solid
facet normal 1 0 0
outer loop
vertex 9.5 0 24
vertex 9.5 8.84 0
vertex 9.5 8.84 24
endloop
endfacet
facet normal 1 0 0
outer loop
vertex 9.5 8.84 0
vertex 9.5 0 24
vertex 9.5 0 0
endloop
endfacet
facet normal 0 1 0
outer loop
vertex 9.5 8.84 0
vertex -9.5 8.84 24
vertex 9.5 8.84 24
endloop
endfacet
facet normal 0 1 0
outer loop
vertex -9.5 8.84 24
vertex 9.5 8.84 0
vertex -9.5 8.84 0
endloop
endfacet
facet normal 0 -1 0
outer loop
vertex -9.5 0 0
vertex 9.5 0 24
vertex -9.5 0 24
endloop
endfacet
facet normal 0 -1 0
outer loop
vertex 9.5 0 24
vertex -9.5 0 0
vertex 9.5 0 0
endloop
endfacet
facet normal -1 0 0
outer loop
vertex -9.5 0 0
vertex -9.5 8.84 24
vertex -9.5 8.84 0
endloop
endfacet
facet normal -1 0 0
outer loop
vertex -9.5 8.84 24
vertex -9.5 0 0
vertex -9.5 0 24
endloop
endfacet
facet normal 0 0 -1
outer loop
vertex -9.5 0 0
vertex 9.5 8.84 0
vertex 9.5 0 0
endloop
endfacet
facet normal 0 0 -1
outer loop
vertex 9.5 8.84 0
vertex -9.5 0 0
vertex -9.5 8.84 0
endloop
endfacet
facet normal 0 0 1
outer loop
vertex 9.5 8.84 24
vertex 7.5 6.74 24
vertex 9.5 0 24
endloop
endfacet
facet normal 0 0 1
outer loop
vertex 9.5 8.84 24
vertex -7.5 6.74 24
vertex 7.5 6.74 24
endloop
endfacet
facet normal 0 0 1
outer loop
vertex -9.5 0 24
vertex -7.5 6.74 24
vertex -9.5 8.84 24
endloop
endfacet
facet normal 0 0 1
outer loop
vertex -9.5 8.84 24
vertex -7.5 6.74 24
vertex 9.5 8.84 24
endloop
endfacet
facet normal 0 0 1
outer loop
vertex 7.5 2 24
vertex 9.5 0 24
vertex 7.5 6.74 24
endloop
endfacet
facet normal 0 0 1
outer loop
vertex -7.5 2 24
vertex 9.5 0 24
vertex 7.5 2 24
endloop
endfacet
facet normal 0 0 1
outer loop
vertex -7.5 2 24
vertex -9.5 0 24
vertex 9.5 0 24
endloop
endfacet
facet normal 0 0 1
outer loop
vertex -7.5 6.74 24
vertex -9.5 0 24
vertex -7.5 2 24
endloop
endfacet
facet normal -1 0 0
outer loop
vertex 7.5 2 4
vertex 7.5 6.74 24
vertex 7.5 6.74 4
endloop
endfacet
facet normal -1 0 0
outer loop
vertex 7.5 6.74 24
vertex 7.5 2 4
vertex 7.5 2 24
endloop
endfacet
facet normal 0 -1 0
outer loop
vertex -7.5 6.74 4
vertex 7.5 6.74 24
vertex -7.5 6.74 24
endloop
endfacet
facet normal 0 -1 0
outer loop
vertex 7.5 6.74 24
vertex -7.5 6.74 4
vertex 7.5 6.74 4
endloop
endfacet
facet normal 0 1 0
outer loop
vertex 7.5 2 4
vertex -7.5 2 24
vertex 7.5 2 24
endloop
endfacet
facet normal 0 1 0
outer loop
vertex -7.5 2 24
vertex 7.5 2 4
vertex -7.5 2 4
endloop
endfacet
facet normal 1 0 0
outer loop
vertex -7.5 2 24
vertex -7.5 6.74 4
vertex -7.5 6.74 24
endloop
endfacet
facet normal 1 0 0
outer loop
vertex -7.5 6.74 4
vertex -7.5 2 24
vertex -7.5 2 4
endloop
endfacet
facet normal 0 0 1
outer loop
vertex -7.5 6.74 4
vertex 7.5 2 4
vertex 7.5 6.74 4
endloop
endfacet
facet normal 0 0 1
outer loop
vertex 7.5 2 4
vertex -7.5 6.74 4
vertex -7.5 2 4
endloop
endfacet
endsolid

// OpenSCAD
//
//  WoodChistelBladeCover.scad
//
//  Evilteach  6/18/2016
//
//   
bladeWidth   = 15.00;
bladeDepth   = 20.00;
bladeHeight  =  4.84;

offset       =  2.00;
tighteness   =  0.10;

boxWidth  = bladeWidth + offset * 2;
boxDepth  = bladeDepth + offset * 2;
boxHeight = bladeHeight + offset * 2;

cutoutWidth  = boxWidth  - offset * 2;
cutoutDepth  = boxDepth  - offset * 2;
cutoutHeight = boxHeight - offset * 2;

module box()
{
    color("yellow")
        cube([boxWidth, boxDepth, boxHeight]);
}

module cutout()
{
    color("cyan")
        cube([cutoutWidth, cutoutDepth, cutoutHeight - tighteness]);
}


module main()
{
    translate([-boxWidth / 2, 0, boxDepth])
        rotate([270, 0, 0])
            difference()
            {
                box();
                
                translate([offset, 0, offset])
                    cutout();
            }
}


main();
